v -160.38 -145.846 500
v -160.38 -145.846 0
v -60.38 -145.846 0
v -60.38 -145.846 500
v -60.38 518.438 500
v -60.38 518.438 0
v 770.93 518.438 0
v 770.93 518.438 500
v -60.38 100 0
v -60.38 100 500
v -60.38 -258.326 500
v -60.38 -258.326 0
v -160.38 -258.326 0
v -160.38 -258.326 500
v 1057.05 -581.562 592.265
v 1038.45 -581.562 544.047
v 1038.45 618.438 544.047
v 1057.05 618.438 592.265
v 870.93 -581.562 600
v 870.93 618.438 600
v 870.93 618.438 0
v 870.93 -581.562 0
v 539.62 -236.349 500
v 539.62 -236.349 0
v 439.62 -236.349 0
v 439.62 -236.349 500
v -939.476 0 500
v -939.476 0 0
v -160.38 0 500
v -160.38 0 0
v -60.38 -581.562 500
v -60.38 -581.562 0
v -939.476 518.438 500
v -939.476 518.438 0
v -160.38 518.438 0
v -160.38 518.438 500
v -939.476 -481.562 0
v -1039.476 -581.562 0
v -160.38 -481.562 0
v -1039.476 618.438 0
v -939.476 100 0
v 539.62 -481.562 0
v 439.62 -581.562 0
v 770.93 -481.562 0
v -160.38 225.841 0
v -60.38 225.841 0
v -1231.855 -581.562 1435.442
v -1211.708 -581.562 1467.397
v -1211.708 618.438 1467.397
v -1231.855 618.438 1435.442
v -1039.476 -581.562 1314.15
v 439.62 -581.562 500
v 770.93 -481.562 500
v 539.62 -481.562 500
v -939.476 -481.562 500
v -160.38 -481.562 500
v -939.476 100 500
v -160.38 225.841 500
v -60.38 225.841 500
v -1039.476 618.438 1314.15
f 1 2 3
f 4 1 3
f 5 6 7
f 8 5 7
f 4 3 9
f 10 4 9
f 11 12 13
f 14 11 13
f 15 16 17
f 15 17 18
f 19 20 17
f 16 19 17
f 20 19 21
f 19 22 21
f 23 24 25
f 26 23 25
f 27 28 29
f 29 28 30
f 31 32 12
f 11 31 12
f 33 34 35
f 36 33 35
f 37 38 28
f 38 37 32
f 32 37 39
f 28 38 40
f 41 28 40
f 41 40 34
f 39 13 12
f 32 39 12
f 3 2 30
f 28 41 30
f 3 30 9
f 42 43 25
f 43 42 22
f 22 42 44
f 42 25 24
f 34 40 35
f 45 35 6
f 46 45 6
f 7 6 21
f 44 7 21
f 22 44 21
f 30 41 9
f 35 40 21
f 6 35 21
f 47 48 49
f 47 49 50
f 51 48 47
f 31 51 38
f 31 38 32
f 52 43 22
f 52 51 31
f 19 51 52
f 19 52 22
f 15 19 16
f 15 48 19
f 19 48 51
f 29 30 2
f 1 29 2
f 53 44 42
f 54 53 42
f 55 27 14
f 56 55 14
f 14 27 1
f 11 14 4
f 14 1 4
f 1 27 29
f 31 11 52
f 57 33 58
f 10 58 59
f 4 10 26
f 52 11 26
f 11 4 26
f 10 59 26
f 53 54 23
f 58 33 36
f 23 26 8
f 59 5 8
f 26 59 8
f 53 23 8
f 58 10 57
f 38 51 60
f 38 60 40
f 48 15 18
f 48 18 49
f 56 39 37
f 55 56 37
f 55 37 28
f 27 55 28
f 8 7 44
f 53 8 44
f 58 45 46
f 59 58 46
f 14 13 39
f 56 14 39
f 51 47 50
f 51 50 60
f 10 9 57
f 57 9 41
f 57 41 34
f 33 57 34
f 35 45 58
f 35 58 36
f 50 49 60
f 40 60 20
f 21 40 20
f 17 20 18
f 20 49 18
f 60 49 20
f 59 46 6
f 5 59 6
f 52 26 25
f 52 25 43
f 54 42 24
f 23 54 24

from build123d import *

# Parameters (mm, degrees)
F0_W     = 222.1541649566
F0_H     = 100
F0_W_2   = 395.4195475671
F0_W_3   = 188.4643873005
F0_W_4   = 100
F0_H_2   = 361.5790828629
F0_H_3   = 156.8592581168
F0_H_4   = 152.8593497919
F0_W_5   = 170.2914773738
F0_W_6   = 779.0951247443
F0_H_5   = 292.5978301498
F1_DEPTH = 500
F2_W     = 1910.4056636256
F2_H     = 1200
F3_DEPTH = 100
F5_DEPTH = 1200


with BuildPart() as f1:
    # F0 (on Top) → F1 (new body)
    with BuildSketch(Plane.XY):
        Polygon((-1039.4755020642, -481.5616590203), (-939.4755020642, -481.5616590203), (-939.4755020642, 0), (-939.4755020642, 100), (-939.4755020642, 518.4383409797), (-1039.4755020642, 518.4383409797), align=None)
        Polygon((-710.1491273506, -481.5616590203), (-939.4755020642, -481.5616590203), (-1039.4755020642, -481.5616590203), (-1039.4755020642, -581.5616590203), (-710.1491273506, -581.5616590203), align=None)
        Polygon((-1039.4755020642, 618.4383409797), (-1039.4755020642, 518.4383409797), (-939.4755020642, 518.4383409797), (-659.1245005101, 518.4383409797), (-659.1245005101, 618.4383409797), align=None)
        with Locations((-548.0474180319, 568.4383409797)):
            Rectangle(F0_W, F0_H)
        Polygon((-436.9703355536, 618.4383409797), (-436.9703355536, 518.4383409797), (-160.3803773199, 518.4383409797), (-60.3803773199, 518.4383409797), (-60.3803773199, 618.4383409797), (-81.4295849381, 618.4383409797), align=None)
        with Locations((137.3293964637, 568.4383409797)):
            Rectangle(F0_W_2, F0_H)
        with Locations((429.2713638974, 568.4383409797)):
            Rectangle(F0_W_3, F0_H)
        Polygon((523.5035575476, 618.4383409797), (523.5035575476, 518.4383409797), (770.9301615614, 518.4383409797), (870.9301615614, 518.4383409797), (870.9301615614, 618.4383409797), align=None)
        with Locations((820.9301615614, 337.6487995483)):
            Rectangle(F0_W_4, F0_H_2)
        with Locations((820.9301615614, 78.4296290584)):
            Rectangle(F0_W_4, F0_H_3)
        with Locations((820.9301615614, -76.429674896)):
            Rectangle(F0_W_4, F0_H_4)
        Polygon((770.9301615614, -481.5616590203), (770.9301615614, -581.5616590203), (870.9301615614, -581.5616590203), (870.9301615614, -170.4701158022), (870.9301615614, -152.8593497919), (770.9301615614, -152.8593497919), align=None)
        Polygon((439.6196226801, -499.1724250305), (439.6196226801, -581.5616590203), (770.9301615614, -581.5616590203), (770.9301615614, -481.5616590203), (539.6196226801, -481.5616590203), (539.6196226801, -236.3492257267), (439.6196226801, -236.3492257267), (439.6196226801, -481.5616590203), align=None)
        Polygon((-160.3803773199, -258.3257411009), (-160.3803773199, -481.5616590203), (-160.3803773199, -508.6633241055), (-160.3803773199, -581.5616590203), (-60.3803773199, -581.5616590203), (-60.3803773199, -258.3257411009), align=None)
        with Locations((-625.0033886637, -531.5616590203)):
            Rectangle(F0_W_5, F0_H)
        with Locations((-549.927939692, 50)):
            Rectangle(F0_W_6, F0_H)
        Polygon((-160.3803773199, -481.5616590203), (-539.8576499768, -481.5616590203), (-539.8576499768, -581.5616590203), (-160.3803773199, -581.5616590203), (-160.3803773199, -508.6633241055), align=None)
        Polygon((-160.3803773199, 100), (-160.3803773199, 0), (-160.3803773199, -145.845679975), (-60.3803773199, -145.845679975), (-60.3803773199, 100), align=None)
        with Locations((-110.3803773199, 372.1394259048)):
            Rectangle(F0_W_4, F0_H_5)
    extrude(amount=F1_DEPTH)

    # F2 (on face) → F3 (join)
    with BuildSketch(Plane.XY.offset(500)):
        with Locations((-84.2726702514, 18.4383409797)):
            Rectangle(F2_W, F2_H)
    extrude(amount=F3_DEPTH)

    # F4 (on face) → F5 (join)
    with BuildSketch(Plane.XZ.offset(581.5616590203)):
        Polygon((-1039.4755020642, 1188.9448165894), (-1039.4755020642, 600), (870.9301615614, 600), (1038.4503075273, 544.0466226834), (1057.0495128632, 592.2645926476), (-1211.7080801369, 1467.3965893042), (-1231.8549156189, 1435.4420900345), (-1039.4755020642, 1314.1497373581), align=None)
    extrude(amount=-F5_DEPTH)


solid = f1.part
